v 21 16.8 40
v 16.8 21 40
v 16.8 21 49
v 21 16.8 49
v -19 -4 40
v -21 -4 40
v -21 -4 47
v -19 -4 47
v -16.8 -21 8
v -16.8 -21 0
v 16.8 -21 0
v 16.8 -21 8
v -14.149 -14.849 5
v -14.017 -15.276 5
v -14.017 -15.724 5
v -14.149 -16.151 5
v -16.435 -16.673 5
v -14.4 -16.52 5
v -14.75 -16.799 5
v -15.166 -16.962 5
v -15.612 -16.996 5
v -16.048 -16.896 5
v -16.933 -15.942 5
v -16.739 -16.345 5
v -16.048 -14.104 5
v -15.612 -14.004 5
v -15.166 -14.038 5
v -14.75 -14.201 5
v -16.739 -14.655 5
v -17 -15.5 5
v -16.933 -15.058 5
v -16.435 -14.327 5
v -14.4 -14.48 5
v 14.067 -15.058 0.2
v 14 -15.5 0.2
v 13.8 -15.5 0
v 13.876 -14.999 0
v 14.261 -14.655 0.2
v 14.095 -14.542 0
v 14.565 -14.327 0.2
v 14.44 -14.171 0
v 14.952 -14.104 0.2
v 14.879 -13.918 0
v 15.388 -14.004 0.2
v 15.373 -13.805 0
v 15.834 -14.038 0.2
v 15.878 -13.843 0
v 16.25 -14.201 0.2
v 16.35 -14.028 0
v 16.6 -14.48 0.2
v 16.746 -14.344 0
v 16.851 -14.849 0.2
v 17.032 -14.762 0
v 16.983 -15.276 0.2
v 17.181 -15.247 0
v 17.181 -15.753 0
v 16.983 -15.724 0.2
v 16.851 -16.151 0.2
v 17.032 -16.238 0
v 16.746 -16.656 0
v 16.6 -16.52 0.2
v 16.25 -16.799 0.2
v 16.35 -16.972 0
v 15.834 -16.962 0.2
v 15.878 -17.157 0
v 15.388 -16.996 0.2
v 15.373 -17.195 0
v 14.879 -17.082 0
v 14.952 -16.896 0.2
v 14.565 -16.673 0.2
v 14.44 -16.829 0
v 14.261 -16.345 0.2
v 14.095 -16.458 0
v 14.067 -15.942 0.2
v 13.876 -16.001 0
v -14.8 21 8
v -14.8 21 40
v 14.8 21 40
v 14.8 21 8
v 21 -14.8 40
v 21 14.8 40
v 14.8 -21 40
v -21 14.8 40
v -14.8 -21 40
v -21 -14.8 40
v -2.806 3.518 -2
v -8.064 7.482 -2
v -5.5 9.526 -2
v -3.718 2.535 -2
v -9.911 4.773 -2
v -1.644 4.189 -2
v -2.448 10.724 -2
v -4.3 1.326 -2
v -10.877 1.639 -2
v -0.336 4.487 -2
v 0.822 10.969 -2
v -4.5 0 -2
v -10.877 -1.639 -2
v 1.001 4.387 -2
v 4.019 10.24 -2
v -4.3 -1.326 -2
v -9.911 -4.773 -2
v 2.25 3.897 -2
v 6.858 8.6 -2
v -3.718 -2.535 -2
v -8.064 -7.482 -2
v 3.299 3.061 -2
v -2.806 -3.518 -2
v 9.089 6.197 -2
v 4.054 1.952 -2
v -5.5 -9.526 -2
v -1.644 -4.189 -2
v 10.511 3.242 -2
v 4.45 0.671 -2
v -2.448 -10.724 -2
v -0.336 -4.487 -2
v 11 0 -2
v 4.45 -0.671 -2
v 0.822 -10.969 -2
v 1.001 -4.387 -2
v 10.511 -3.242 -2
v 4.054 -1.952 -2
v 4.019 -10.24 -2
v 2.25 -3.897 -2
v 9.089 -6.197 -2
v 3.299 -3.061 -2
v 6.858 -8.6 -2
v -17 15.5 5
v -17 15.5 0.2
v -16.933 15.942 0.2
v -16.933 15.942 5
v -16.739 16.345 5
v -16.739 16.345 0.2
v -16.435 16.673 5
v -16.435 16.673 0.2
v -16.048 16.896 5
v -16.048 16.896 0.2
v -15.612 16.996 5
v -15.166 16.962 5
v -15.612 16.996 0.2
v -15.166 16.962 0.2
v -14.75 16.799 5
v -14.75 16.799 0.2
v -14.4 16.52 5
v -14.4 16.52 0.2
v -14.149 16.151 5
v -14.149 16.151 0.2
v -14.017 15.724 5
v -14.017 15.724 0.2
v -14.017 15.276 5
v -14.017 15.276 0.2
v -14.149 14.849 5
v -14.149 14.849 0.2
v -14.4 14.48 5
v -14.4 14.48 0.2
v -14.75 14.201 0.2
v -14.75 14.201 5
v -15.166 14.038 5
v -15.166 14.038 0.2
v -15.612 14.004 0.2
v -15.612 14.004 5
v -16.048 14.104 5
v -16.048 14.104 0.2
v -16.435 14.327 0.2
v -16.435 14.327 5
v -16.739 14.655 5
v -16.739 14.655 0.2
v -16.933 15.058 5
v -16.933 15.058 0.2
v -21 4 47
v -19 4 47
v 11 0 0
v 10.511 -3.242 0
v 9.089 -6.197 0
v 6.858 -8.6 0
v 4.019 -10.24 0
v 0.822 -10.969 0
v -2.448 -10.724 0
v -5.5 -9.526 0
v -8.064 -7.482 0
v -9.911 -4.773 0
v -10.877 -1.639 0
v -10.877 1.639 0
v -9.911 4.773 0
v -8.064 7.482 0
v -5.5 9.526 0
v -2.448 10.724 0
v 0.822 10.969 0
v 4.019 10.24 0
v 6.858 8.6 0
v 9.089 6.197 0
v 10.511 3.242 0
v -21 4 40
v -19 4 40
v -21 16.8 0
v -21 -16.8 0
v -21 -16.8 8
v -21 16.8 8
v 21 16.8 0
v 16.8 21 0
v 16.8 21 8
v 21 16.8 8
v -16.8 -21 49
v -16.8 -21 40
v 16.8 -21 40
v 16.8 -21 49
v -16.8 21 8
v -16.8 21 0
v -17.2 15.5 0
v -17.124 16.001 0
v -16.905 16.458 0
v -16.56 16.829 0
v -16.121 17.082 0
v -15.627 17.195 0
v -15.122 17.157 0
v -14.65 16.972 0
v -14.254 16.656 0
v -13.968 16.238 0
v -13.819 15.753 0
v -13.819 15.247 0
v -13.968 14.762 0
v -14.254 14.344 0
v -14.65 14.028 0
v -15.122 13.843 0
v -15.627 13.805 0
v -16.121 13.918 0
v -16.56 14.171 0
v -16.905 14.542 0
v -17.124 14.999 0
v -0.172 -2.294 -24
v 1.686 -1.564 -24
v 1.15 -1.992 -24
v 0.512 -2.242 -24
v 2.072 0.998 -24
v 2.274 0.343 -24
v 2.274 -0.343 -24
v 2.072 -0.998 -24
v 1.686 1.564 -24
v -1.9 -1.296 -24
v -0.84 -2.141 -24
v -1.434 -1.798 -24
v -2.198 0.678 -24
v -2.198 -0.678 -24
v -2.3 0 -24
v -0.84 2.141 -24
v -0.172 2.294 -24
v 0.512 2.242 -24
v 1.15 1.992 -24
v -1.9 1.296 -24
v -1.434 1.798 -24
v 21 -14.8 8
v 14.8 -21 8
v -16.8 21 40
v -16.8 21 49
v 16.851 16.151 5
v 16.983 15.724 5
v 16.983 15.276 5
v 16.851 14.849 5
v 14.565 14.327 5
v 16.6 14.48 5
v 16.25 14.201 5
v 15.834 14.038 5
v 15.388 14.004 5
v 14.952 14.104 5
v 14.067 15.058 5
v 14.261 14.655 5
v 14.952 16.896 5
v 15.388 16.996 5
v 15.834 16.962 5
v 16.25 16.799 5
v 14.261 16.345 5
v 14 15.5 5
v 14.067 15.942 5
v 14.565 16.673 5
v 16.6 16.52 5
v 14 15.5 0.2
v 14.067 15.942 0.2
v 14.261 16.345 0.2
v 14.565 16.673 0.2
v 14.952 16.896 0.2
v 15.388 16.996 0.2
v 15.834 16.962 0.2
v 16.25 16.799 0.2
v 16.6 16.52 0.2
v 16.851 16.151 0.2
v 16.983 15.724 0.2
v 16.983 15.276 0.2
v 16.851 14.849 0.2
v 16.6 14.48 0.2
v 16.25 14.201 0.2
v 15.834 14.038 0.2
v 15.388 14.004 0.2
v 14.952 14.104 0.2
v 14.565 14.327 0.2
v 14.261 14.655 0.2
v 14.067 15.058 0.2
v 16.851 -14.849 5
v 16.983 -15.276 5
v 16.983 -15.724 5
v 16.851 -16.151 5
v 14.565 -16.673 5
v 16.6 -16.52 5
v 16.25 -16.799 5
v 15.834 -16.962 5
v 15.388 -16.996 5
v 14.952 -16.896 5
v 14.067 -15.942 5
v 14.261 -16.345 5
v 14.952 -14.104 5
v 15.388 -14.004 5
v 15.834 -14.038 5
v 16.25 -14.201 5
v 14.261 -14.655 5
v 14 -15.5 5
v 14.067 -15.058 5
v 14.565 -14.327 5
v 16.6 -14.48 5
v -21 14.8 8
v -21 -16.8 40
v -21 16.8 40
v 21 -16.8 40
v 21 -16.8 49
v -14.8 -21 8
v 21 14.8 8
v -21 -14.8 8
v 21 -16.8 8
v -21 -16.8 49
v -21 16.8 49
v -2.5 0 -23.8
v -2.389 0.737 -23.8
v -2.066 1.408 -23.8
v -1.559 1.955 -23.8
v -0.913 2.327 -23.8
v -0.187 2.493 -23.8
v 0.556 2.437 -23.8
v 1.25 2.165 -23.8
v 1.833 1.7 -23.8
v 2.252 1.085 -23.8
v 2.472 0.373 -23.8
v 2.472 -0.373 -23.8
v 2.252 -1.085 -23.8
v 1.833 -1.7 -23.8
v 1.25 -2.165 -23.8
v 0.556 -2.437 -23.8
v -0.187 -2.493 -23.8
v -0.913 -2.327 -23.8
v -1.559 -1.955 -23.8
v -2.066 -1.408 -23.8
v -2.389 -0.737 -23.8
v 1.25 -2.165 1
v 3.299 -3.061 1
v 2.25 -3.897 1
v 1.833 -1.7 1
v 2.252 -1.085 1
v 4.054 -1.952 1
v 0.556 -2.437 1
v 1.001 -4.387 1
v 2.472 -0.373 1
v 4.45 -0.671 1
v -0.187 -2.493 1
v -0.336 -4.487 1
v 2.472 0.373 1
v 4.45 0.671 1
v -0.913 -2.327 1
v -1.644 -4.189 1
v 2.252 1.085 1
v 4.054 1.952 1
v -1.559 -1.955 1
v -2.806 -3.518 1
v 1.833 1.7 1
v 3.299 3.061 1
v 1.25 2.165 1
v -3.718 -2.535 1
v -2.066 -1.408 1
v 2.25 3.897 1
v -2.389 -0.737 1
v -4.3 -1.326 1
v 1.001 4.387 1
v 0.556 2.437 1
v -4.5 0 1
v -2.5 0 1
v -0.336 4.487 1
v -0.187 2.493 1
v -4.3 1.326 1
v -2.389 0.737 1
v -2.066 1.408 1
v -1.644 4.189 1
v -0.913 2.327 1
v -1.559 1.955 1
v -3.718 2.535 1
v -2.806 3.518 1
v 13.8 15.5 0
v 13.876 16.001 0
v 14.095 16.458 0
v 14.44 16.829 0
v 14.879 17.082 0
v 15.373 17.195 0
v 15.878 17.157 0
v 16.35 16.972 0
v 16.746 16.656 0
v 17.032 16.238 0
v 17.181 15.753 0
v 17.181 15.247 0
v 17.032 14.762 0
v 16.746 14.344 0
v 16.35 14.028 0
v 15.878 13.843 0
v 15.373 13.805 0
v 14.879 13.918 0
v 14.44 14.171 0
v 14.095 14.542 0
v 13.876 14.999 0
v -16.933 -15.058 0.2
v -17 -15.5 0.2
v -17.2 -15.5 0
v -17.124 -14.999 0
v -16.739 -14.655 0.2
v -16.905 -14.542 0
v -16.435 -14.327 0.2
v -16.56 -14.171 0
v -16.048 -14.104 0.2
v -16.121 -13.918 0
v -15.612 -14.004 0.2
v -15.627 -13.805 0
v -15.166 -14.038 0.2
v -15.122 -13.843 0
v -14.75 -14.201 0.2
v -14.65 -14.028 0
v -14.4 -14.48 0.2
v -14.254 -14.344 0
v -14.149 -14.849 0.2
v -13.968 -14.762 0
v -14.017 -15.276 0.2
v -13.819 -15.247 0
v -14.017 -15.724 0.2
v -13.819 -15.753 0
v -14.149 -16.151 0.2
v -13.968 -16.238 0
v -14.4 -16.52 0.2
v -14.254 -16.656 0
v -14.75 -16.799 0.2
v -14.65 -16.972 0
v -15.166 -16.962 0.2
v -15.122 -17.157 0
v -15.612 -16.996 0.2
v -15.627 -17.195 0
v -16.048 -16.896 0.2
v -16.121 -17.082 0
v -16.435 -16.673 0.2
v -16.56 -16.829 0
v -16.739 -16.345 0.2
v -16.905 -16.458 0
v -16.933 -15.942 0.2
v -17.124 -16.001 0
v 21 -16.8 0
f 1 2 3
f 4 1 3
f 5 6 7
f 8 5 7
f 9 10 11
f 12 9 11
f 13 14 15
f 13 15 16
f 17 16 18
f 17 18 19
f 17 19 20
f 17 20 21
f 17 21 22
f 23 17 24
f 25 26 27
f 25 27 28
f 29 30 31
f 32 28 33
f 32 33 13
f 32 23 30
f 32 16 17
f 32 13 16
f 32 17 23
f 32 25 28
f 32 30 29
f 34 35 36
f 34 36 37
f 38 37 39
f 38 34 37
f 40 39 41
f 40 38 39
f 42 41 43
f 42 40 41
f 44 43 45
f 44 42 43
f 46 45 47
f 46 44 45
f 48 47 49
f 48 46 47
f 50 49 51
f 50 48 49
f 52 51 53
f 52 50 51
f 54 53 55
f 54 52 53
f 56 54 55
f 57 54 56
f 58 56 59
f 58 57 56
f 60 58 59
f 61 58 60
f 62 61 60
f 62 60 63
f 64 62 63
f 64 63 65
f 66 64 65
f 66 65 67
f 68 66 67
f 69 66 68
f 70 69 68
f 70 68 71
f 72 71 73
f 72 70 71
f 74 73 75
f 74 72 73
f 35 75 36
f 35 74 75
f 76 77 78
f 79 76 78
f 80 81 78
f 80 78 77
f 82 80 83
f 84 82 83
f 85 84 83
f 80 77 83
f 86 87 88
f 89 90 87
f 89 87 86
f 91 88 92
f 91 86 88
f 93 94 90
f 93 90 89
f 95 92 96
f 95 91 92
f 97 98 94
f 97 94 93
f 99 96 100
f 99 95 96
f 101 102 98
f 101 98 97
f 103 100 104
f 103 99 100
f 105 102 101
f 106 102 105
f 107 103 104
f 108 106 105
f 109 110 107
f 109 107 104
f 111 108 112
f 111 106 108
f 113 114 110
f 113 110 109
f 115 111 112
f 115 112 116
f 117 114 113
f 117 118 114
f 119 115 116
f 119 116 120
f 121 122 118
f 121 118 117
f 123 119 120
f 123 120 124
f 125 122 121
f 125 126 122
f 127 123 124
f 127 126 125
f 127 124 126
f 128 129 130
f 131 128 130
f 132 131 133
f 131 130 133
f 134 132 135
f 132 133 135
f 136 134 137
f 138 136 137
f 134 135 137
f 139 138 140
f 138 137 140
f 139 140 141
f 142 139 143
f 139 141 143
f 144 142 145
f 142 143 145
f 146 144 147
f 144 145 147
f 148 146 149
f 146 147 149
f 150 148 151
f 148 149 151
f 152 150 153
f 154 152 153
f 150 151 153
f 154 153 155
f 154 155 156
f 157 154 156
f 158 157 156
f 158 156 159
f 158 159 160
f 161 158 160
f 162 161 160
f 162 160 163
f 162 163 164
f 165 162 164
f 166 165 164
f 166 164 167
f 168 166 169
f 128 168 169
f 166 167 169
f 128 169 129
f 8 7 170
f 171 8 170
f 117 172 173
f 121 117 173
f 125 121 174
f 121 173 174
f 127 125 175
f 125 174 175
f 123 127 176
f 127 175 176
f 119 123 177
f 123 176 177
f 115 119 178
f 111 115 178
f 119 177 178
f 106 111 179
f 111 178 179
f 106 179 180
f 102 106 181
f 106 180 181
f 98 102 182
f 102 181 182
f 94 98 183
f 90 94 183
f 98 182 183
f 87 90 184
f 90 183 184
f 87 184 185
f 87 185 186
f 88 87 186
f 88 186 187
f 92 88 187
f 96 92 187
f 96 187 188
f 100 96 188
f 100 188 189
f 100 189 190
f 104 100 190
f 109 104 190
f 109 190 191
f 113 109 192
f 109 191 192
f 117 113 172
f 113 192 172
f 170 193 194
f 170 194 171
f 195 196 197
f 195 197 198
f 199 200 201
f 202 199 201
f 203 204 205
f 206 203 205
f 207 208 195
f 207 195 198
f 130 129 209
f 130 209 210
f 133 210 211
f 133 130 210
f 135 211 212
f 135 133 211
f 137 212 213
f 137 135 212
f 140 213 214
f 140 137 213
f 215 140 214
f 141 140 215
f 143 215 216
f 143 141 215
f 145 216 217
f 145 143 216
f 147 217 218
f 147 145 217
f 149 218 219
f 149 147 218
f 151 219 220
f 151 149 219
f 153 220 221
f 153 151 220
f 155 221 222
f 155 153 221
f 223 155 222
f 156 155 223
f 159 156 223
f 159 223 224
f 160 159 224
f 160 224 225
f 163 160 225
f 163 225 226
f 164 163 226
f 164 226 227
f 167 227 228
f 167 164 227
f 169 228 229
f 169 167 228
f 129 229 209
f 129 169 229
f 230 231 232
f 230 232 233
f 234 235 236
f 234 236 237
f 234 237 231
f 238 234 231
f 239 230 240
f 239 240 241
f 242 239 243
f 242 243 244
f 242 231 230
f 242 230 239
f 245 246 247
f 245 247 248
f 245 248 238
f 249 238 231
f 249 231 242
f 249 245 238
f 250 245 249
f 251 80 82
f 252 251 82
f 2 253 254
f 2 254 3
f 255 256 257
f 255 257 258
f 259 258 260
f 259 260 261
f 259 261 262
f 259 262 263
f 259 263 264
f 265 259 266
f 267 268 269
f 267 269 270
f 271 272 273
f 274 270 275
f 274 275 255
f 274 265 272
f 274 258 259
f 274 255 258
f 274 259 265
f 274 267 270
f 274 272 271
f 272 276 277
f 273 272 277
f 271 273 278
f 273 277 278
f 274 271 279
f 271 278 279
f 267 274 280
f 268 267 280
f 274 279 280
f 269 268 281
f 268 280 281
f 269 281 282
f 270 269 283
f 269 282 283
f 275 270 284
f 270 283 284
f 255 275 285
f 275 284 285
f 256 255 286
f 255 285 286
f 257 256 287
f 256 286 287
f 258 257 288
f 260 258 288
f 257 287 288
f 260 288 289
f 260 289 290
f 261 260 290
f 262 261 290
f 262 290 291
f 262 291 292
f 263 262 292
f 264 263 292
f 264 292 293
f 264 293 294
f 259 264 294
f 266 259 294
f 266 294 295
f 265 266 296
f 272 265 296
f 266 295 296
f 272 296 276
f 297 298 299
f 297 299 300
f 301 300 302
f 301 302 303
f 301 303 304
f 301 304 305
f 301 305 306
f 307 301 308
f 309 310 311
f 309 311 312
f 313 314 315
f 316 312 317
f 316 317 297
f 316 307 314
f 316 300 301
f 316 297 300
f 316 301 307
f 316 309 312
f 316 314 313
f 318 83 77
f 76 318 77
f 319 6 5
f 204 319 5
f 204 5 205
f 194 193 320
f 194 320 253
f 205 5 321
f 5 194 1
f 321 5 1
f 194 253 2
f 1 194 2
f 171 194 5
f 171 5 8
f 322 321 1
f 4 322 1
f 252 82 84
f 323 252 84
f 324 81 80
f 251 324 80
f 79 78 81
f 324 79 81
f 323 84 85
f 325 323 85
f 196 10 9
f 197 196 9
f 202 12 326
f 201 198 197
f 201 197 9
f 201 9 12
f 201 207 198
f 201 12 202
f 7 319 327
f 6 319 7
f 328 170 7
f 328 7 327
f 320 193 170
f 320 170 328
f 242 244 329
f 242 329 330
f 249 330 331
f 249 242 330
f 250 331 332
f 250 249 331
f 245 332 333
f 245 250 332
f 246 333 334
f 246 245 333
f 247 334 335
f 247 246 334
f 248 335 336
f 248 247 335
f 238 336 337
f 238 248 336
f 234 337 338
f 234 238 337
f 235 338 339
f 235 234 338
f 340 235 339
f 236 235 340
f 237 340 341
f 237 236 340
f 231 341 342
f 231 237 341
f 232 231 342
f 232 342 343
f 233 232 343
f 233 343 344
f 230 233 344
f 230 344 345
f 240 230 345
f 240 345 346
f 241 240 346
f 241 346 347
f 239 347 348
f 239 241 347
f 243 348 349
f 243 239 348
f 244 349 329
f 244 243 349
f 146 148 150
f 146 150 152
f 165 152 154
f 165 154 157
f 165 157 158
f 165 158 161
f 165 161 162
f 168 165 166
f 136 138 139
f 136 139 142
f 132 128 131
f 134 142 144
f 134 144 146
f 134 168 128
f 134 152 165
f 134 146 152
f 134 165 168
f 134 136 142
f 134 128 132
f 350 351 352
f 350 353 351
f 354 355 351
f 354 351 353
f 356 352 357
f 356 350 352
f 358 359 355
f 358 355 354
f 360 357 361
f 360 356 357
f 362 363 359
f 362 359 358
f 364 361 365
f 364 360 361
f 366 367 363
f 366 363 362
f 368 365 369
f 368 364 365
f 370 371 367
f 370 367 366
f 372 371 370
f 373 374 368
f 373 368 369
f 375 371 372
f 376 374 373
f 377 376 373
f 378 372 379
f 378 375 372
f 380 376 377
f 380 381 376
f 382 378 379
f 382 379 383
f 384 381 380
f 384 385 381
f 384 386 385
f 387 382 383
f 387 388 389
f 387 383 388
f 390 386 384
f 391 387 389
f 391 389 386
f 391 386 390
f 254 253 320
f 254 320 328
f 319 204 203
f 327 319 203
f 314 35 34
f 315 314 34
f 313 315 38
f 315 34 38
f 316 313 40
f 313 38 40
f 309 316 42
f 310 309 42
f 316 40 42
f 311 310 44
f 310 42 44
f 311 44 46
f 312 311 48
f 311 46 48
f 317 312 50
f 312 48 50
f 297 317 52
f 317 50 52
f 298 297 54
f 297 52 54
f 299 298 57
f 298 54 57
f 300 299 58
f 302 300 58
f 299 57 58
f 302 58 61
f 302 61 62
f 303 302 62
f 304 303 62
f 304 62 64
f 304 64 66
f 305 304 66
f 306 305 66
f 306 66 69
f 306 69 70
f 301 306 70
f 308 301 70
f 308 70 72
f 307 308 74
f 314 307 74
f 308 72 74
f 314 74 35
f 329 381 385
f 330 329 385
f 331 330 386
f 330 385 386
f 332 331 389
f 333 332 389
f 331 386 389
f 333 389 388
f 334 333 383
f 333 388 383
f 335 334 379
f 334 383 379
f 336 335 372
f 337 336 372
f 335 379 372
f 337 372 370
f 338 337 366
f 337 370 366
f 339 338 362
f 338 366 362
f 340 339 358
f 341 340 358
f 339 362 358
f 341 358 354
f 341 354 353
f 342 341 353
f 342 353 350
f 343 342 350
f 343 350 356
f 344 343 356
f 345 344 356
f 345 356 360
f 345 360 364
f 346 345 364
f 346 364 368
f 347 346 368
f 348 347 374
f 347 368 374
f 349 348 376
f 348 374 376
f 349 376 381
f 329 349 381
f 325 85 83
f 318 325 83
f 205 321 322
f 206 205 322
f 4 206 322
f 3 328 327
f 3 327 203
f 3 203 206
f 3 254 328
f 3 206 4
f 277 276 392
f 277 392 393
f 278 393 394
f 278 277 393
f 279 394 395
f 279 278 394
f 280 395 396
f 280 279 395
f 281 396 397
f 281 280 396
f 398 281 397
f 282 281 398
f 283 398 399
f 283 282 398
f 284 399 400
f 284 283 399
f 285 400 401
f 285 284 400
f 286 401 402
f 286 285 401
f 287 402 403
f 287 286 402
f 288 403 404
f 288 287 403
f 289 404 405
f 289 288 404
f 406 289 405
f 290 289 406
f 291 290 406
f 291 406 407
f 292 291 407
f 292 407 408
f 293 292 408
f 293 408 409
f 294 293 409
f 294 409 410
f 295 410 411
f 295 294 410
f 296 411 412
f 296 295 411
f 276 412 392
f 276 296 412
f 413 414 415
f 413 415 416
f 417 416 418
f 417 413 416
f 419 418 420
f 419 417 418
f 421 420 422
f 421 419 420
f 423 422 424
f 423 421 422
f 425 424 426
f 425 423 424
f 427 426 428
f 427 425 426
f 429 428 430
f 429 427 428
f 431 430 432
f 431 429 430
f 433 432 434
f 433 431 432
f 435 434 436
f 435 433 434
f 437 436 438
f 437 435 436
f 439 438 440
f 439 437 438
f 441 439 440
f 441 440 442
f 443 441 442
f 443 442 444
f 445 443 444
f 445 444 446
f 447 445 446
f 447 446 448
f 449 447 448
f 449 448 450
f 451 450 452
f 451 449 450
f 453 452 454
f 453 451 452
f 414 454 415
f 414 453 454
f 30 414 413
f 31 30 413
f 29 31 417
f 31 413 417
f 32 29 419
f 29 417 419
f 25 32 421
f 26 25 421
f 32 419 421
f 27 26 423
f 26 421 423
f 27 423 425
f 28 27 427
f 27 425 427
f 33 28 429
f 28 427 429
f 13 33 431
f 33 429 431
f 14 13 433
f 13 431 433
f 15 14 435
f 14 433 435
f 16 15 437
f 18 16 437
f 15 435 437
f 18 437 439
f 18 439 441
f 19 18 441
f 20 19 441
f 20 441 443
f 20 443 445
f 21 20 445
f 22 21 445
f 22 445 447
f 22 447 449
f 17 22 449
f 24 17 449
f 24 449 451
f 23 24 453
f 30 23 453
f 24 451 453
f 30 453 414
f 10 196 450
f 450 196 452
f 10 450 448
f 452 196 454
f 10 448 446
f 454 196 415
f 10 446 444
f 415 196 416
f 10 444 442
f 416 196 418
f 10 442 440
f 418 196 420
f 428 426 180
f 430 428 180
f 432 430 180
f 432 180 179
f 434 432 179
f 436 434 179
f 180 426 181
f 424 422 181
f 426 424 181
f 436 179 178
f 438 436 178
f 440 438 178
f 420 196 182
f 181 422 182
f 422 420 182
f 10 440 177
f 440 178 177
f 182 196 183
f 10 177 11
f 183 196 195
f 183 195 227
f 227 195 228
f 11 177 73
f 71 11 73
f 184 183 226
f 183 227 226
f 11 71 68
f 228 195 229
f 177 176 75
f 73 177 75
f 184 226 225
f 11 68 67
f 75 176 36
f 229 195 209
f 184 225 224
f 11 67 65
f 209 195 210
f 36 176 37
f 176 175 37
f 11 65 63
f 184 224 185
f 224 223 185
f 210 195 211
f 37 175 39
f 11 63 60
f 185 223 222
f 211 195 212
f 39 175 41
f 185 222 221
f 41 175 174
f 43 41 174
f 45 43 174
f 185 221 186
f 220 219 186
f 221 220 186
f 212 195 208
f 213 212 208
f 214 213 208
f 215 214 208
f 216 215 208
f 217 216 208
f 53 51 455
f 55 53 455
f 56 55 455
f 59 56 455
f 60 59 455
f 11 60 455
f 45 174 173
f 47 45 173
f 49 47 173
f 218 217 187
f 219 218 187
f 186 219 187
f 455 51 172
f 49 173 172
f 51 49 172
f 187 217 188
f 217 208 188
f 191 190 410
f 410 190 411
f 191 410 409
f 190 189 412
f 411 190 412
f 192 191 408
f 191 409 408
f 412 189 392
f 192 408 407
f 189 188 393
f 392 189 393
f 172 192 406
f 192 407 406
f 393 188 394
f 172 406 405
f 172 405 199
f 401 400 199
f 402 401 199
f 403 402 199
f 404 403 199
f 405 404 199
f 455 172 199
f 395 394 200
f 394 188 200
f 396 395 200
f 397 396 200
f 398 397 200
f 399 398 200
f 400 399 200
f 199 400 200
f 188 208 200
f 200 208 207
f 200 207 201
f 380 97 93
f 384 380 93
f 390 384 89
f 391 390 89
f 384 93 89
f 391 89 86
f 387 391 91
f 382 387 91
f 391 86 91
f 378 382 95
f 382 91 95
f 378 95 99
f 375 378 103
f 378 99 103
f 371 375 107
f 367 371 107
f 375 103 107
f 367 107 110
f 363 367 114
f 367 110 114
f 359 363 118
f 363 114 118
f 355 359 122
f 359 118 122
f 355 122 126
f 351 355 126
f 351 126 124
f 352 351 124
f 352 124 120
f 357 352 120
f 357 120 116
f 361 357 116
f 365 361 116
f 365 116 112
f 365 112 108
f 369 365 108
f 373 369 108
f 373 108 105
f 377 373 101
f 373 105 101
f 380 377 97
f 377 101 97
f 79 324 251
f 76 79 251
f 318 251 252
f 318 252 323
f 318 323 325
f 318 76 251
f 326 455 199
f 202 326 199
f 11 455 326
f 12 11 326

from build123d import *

# Parameters (mm, degrees)
ESQUISSE1_W             = 42
ESQUISSE1_H             = 42
BOSS_EXTRU_1_DEPTH      = 8
CHANFREIN1_SIZE         = 4.2
BOSS_EXTRU_2_DEPTH      = 32
ESQUISSE4_W             = 42
ESQUISSE4_H             = 42
BOSS_EXTRU_3_DEPTH      = 9
CHANFREIN3_SIZE         = 4.2
ESQUISSE5_R             = 11
BOSS_EXTRU_4_DEPTH      = 2
ESQUISSE6_R             = 4.5
ENL_V_MAT_EXTRU_1_DEPTH = 3
ESQUISSE7_R             = 2.5
BOSS_EXTRU_5_DEPTH      = 25
CHANFREIN4_SIZE         = 0.2
ESQUISSE8_R             = 1.5
ENL_V_MAT_EXTRU_2_DEPTH = 5
CHANFREIN5_SIZE         = 0.2
ESQUISSE9_W             = 7
ESQUISSE9_H             = 8
ENL_V_MAT_EXTRU_3_DEPTH = 2


with BuildPart() as part:
    # Esquisse1 → Boss.-Extru.1 (new body)
    with BuildSketch(Plane.XY):
        Rectangle(ESQUISSE1_W, ESQUISSE1_H)
    extrude(amount=BOSS_EXTRU_1_DEPTH)

    # Chanfrein1
    chanfrein1_edges = [part.edges().sort_by_distance(p)[0] for p in [
        (21, -21, 4),
        (-21, -21, 4),
        (-21, 21, 4),
        (21, 21, 4),
    ]]
    chamfer(chanfrein1_edges, length=CHANFREIN1_SIZE)

    # Esquisse5 → Boss.-Extru.4 (add)
    with BuildSketch(Plane(origin=(0, 0, 0), x_dir=(-1, 0, 0), z_dir=(0, 0, -1))):
        with Locations(Location((0, 0, 0), (0, 0, 180))):
            Circle(ESQUISSE5_R)
    extrude(amount=BOSS_EXTRU_4_DEPTH)

    # Esquisse6 → Enlèv. mat.-Extru.1 (cut)
    with BuildSketch(Plane(origin=(0, 0, -2), x_dir=(-1, 0, 0), z_dir=(0, 0, -1))):
        Circle(ESQUISSE6_R)
    extrude(amount=-ENL_V_MAT_EXTRU_1_DEPTH, mode=Mode.SUBTRACT)

    # Esquisse7 → Boss.-Extru.5 (add)
    with BuildSketch(Plane(origin=(0, 0, 1), x_dir=(-1, 0, 0), z_dir=(0, 0, -1))):
        Circle(ESQUISSE7_R)
    extrude(amount=BOSS_EXTRU_5_DEPTH)

    # Chanfrein4
    chanfrein4_edges = [part.edges().sort_by_distance(p)[0] for p in [
        (2.5, 0, -24),
    ]]
    chamfer(chanfrein4_edges, length=CHANFREIN4_SIZE)

    # Esquisse8 → Enlèv. mat.-Extru.2 (cut)
    with BuildSketch(Plane(origin=(0, 0, 0), x_dir=(-1, 0, 0), z_dir=(0, 0, -1))):
        with Locations((-15.5, 15.5)):
            Circle(ESQUISSE8_R)
        with Locations((15.5, 15.5)):
            Circle(ESQUISSE8_R)
        with Locations((15.5, -15.5)):
            Circle(ESQUISSE8_R)
        with Locations((-15.5, -15.5)):
            Circle(ESQUISSE8_R)
    extrude(amount=-ENL_V_MAT_EXTRU_2_DEPTH, mode=Mode.SUBTRACT)

    # Chanfrein5
    chanfrein5_edges = [part.edges().sort_by_distance(p)[0] for p in [
        (17, 15.5, 0),
        (-14, 15.5, 0),
        (-14, -15.5, 0),
        (17, -15.5, 0),
    ]]
    chamfer(chanfrein5_edges, length=CHANFREIN5_SIZE)


with BuildPart() as body_2:
    # Esquisse3 → Boss.-Extru.2 (new body)
    with BuildSketch(Plane.XY.offset(8)):
        Polygon((-21, 14.8), (-14.8, 21), (14.8, 21), (21, 14.8), (21, -14.8), (14.8, -21), (-14.8, -21), (-21, -14.8), align=None)
    extrude(amount=BOSS_EXTRU_2_DEPTH)


with BuildPart() as body_3:
    # Esquisse4 → Boss.-Extru.3 (new body)
    with BuildSketch(Plane.XY.offset(40)):
        Rectangle(ESQUISSE4_W, ESQUISSE4_H)
    extrude(amount=BOSS_EXTRU_3_DEPTH)

    # Chanfrein3
    chanfrein3_edges = [body_3.edges().sort_by_distance(p)[0] for p in [
        (21, -21, 44.5),
        (-21, -21, 44.5),
        (-21, 21, 44.5),
        (21, 21, 44.5),
    ]]
    chamfer(chanfrein3_edges, length=CHANFREIN3_SIZE)

    # Esquisse9 → Enlèv. mat.-Extru.3 (cut)
    with BuildSketch(Plane.ZY.offset(21)):
        with Locations((43.5, 0)):
            Rectangle(ESQUISSE9_W, ESQUISSE9_H)
    extrude(amount=-ENL_V_MAT_EXTRU_3_DEPTH, mode=Mode.SUBTRACT)


solid = Compound([part.part, body_2.part, body_3.part])
